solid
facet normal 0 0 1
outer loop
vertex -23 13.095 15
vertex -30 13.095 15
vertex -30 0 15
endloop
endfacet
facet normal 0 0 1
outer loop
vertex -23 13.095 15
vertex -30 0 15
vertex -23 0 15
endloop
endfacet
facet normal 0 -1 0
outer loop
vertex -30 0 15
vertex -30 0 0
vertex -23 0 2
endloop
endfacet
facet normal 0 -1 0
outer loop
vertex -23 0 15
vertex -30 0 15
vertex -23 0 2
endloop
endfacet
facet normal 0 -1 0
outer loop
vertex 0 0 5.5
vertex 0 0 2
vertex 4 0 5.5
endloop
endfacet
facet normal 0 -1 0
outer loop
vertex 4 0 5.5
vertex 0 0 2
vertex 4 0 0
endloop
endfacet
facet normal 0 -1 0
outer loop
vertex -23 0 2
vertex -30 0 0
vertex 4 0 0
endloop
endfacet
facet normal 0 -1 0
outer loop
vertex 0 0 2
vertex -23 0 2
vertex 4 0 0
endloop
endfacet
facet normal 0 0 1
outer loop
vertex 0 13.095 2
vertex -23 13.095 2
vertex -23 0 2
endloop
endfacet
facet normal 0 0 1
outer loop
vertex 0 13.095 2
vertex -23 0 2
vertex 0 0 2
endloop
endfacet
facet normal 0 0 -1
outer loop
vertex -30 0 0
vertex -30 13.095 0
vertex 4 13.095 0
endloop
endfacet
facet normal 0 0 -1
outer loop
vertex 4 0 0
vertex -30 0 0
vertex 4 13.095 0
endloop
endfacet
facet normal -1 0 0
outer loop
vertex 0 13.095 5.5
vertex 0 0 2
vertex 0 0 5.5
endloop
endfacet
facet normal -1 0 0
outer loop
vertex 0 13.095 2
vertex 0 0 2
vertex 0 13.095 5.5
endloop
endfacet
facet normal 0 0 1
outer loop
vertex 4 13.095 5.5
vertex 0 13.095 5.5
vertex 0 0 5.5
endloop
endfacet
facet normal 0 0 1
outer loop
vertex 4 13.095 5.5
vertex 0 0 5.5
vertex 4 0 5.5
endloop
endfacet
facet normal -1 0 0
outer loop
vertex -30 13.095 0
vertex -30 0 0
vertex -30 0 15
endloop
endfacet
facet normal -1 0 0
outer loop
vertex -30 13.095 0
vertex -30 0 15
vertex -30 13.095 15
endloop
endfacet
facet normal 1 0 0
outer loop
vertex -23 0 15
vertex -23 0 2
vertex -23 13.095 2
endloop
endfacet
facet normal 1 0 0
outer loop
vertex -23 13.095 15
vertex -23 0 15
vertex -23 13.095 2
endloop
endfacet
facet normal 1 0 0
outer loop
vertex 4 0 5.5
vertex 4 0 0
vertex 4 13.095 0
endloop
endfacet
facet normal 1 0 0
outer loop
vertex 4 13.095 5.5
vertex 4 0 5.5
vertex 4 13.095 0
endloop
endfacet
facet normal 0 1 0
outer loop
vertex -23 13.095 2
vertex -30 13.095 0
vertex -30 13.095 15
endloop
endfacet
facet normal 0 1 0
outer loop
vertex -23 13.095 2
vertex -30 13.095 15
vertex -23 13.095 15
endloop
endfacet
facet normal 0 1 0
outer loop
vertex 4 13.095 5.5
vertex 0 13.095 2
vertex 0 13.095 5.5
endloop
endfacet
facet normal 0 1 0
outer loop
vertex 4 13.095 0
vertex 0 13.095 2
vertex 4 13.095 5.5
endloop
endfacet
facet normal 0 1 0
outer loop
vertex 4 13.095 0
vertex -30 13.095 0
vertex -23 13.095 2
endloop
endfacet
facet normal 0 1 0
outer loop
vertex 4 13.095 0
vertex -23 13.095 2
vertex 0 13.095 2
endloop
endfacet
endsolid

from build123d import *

# Parameters (mm, degrees)
F0_W     = 7
F0_H     = 13.09483
F1_DEPTH = 15
F0_W_2   = 23
F2_DEPTH = 2
F0_W_3   = 4
F3_DEPTH = 5.5


with BuildPart() as f1:
    # F0 (on Top) → F1 (new body)
    with BuildSketch(Plane.XY):
        with Locations((-26.5, 6.547415)):
            Rectangle(F0_W, F0_H)
    extrude(amount=F1_DEPTH)

    # F0 (on Top) → F2 (join)
    with BuildSketch(Plane.XY):
        with Locations((-11.5, 6.547415)):
            Rectangle(F0_W_2, F0_H)
    extrude(amount=F2_DEPTH)

    # F0 (on Top) → F3 (join)
    with BuildSketch(Plane.XY):
        with Locations((2, 6.547415)):
            Rectangle(F0_W_3, F0_H)
    extrude(amount=F3_DEPTH)


solid = f1.part
